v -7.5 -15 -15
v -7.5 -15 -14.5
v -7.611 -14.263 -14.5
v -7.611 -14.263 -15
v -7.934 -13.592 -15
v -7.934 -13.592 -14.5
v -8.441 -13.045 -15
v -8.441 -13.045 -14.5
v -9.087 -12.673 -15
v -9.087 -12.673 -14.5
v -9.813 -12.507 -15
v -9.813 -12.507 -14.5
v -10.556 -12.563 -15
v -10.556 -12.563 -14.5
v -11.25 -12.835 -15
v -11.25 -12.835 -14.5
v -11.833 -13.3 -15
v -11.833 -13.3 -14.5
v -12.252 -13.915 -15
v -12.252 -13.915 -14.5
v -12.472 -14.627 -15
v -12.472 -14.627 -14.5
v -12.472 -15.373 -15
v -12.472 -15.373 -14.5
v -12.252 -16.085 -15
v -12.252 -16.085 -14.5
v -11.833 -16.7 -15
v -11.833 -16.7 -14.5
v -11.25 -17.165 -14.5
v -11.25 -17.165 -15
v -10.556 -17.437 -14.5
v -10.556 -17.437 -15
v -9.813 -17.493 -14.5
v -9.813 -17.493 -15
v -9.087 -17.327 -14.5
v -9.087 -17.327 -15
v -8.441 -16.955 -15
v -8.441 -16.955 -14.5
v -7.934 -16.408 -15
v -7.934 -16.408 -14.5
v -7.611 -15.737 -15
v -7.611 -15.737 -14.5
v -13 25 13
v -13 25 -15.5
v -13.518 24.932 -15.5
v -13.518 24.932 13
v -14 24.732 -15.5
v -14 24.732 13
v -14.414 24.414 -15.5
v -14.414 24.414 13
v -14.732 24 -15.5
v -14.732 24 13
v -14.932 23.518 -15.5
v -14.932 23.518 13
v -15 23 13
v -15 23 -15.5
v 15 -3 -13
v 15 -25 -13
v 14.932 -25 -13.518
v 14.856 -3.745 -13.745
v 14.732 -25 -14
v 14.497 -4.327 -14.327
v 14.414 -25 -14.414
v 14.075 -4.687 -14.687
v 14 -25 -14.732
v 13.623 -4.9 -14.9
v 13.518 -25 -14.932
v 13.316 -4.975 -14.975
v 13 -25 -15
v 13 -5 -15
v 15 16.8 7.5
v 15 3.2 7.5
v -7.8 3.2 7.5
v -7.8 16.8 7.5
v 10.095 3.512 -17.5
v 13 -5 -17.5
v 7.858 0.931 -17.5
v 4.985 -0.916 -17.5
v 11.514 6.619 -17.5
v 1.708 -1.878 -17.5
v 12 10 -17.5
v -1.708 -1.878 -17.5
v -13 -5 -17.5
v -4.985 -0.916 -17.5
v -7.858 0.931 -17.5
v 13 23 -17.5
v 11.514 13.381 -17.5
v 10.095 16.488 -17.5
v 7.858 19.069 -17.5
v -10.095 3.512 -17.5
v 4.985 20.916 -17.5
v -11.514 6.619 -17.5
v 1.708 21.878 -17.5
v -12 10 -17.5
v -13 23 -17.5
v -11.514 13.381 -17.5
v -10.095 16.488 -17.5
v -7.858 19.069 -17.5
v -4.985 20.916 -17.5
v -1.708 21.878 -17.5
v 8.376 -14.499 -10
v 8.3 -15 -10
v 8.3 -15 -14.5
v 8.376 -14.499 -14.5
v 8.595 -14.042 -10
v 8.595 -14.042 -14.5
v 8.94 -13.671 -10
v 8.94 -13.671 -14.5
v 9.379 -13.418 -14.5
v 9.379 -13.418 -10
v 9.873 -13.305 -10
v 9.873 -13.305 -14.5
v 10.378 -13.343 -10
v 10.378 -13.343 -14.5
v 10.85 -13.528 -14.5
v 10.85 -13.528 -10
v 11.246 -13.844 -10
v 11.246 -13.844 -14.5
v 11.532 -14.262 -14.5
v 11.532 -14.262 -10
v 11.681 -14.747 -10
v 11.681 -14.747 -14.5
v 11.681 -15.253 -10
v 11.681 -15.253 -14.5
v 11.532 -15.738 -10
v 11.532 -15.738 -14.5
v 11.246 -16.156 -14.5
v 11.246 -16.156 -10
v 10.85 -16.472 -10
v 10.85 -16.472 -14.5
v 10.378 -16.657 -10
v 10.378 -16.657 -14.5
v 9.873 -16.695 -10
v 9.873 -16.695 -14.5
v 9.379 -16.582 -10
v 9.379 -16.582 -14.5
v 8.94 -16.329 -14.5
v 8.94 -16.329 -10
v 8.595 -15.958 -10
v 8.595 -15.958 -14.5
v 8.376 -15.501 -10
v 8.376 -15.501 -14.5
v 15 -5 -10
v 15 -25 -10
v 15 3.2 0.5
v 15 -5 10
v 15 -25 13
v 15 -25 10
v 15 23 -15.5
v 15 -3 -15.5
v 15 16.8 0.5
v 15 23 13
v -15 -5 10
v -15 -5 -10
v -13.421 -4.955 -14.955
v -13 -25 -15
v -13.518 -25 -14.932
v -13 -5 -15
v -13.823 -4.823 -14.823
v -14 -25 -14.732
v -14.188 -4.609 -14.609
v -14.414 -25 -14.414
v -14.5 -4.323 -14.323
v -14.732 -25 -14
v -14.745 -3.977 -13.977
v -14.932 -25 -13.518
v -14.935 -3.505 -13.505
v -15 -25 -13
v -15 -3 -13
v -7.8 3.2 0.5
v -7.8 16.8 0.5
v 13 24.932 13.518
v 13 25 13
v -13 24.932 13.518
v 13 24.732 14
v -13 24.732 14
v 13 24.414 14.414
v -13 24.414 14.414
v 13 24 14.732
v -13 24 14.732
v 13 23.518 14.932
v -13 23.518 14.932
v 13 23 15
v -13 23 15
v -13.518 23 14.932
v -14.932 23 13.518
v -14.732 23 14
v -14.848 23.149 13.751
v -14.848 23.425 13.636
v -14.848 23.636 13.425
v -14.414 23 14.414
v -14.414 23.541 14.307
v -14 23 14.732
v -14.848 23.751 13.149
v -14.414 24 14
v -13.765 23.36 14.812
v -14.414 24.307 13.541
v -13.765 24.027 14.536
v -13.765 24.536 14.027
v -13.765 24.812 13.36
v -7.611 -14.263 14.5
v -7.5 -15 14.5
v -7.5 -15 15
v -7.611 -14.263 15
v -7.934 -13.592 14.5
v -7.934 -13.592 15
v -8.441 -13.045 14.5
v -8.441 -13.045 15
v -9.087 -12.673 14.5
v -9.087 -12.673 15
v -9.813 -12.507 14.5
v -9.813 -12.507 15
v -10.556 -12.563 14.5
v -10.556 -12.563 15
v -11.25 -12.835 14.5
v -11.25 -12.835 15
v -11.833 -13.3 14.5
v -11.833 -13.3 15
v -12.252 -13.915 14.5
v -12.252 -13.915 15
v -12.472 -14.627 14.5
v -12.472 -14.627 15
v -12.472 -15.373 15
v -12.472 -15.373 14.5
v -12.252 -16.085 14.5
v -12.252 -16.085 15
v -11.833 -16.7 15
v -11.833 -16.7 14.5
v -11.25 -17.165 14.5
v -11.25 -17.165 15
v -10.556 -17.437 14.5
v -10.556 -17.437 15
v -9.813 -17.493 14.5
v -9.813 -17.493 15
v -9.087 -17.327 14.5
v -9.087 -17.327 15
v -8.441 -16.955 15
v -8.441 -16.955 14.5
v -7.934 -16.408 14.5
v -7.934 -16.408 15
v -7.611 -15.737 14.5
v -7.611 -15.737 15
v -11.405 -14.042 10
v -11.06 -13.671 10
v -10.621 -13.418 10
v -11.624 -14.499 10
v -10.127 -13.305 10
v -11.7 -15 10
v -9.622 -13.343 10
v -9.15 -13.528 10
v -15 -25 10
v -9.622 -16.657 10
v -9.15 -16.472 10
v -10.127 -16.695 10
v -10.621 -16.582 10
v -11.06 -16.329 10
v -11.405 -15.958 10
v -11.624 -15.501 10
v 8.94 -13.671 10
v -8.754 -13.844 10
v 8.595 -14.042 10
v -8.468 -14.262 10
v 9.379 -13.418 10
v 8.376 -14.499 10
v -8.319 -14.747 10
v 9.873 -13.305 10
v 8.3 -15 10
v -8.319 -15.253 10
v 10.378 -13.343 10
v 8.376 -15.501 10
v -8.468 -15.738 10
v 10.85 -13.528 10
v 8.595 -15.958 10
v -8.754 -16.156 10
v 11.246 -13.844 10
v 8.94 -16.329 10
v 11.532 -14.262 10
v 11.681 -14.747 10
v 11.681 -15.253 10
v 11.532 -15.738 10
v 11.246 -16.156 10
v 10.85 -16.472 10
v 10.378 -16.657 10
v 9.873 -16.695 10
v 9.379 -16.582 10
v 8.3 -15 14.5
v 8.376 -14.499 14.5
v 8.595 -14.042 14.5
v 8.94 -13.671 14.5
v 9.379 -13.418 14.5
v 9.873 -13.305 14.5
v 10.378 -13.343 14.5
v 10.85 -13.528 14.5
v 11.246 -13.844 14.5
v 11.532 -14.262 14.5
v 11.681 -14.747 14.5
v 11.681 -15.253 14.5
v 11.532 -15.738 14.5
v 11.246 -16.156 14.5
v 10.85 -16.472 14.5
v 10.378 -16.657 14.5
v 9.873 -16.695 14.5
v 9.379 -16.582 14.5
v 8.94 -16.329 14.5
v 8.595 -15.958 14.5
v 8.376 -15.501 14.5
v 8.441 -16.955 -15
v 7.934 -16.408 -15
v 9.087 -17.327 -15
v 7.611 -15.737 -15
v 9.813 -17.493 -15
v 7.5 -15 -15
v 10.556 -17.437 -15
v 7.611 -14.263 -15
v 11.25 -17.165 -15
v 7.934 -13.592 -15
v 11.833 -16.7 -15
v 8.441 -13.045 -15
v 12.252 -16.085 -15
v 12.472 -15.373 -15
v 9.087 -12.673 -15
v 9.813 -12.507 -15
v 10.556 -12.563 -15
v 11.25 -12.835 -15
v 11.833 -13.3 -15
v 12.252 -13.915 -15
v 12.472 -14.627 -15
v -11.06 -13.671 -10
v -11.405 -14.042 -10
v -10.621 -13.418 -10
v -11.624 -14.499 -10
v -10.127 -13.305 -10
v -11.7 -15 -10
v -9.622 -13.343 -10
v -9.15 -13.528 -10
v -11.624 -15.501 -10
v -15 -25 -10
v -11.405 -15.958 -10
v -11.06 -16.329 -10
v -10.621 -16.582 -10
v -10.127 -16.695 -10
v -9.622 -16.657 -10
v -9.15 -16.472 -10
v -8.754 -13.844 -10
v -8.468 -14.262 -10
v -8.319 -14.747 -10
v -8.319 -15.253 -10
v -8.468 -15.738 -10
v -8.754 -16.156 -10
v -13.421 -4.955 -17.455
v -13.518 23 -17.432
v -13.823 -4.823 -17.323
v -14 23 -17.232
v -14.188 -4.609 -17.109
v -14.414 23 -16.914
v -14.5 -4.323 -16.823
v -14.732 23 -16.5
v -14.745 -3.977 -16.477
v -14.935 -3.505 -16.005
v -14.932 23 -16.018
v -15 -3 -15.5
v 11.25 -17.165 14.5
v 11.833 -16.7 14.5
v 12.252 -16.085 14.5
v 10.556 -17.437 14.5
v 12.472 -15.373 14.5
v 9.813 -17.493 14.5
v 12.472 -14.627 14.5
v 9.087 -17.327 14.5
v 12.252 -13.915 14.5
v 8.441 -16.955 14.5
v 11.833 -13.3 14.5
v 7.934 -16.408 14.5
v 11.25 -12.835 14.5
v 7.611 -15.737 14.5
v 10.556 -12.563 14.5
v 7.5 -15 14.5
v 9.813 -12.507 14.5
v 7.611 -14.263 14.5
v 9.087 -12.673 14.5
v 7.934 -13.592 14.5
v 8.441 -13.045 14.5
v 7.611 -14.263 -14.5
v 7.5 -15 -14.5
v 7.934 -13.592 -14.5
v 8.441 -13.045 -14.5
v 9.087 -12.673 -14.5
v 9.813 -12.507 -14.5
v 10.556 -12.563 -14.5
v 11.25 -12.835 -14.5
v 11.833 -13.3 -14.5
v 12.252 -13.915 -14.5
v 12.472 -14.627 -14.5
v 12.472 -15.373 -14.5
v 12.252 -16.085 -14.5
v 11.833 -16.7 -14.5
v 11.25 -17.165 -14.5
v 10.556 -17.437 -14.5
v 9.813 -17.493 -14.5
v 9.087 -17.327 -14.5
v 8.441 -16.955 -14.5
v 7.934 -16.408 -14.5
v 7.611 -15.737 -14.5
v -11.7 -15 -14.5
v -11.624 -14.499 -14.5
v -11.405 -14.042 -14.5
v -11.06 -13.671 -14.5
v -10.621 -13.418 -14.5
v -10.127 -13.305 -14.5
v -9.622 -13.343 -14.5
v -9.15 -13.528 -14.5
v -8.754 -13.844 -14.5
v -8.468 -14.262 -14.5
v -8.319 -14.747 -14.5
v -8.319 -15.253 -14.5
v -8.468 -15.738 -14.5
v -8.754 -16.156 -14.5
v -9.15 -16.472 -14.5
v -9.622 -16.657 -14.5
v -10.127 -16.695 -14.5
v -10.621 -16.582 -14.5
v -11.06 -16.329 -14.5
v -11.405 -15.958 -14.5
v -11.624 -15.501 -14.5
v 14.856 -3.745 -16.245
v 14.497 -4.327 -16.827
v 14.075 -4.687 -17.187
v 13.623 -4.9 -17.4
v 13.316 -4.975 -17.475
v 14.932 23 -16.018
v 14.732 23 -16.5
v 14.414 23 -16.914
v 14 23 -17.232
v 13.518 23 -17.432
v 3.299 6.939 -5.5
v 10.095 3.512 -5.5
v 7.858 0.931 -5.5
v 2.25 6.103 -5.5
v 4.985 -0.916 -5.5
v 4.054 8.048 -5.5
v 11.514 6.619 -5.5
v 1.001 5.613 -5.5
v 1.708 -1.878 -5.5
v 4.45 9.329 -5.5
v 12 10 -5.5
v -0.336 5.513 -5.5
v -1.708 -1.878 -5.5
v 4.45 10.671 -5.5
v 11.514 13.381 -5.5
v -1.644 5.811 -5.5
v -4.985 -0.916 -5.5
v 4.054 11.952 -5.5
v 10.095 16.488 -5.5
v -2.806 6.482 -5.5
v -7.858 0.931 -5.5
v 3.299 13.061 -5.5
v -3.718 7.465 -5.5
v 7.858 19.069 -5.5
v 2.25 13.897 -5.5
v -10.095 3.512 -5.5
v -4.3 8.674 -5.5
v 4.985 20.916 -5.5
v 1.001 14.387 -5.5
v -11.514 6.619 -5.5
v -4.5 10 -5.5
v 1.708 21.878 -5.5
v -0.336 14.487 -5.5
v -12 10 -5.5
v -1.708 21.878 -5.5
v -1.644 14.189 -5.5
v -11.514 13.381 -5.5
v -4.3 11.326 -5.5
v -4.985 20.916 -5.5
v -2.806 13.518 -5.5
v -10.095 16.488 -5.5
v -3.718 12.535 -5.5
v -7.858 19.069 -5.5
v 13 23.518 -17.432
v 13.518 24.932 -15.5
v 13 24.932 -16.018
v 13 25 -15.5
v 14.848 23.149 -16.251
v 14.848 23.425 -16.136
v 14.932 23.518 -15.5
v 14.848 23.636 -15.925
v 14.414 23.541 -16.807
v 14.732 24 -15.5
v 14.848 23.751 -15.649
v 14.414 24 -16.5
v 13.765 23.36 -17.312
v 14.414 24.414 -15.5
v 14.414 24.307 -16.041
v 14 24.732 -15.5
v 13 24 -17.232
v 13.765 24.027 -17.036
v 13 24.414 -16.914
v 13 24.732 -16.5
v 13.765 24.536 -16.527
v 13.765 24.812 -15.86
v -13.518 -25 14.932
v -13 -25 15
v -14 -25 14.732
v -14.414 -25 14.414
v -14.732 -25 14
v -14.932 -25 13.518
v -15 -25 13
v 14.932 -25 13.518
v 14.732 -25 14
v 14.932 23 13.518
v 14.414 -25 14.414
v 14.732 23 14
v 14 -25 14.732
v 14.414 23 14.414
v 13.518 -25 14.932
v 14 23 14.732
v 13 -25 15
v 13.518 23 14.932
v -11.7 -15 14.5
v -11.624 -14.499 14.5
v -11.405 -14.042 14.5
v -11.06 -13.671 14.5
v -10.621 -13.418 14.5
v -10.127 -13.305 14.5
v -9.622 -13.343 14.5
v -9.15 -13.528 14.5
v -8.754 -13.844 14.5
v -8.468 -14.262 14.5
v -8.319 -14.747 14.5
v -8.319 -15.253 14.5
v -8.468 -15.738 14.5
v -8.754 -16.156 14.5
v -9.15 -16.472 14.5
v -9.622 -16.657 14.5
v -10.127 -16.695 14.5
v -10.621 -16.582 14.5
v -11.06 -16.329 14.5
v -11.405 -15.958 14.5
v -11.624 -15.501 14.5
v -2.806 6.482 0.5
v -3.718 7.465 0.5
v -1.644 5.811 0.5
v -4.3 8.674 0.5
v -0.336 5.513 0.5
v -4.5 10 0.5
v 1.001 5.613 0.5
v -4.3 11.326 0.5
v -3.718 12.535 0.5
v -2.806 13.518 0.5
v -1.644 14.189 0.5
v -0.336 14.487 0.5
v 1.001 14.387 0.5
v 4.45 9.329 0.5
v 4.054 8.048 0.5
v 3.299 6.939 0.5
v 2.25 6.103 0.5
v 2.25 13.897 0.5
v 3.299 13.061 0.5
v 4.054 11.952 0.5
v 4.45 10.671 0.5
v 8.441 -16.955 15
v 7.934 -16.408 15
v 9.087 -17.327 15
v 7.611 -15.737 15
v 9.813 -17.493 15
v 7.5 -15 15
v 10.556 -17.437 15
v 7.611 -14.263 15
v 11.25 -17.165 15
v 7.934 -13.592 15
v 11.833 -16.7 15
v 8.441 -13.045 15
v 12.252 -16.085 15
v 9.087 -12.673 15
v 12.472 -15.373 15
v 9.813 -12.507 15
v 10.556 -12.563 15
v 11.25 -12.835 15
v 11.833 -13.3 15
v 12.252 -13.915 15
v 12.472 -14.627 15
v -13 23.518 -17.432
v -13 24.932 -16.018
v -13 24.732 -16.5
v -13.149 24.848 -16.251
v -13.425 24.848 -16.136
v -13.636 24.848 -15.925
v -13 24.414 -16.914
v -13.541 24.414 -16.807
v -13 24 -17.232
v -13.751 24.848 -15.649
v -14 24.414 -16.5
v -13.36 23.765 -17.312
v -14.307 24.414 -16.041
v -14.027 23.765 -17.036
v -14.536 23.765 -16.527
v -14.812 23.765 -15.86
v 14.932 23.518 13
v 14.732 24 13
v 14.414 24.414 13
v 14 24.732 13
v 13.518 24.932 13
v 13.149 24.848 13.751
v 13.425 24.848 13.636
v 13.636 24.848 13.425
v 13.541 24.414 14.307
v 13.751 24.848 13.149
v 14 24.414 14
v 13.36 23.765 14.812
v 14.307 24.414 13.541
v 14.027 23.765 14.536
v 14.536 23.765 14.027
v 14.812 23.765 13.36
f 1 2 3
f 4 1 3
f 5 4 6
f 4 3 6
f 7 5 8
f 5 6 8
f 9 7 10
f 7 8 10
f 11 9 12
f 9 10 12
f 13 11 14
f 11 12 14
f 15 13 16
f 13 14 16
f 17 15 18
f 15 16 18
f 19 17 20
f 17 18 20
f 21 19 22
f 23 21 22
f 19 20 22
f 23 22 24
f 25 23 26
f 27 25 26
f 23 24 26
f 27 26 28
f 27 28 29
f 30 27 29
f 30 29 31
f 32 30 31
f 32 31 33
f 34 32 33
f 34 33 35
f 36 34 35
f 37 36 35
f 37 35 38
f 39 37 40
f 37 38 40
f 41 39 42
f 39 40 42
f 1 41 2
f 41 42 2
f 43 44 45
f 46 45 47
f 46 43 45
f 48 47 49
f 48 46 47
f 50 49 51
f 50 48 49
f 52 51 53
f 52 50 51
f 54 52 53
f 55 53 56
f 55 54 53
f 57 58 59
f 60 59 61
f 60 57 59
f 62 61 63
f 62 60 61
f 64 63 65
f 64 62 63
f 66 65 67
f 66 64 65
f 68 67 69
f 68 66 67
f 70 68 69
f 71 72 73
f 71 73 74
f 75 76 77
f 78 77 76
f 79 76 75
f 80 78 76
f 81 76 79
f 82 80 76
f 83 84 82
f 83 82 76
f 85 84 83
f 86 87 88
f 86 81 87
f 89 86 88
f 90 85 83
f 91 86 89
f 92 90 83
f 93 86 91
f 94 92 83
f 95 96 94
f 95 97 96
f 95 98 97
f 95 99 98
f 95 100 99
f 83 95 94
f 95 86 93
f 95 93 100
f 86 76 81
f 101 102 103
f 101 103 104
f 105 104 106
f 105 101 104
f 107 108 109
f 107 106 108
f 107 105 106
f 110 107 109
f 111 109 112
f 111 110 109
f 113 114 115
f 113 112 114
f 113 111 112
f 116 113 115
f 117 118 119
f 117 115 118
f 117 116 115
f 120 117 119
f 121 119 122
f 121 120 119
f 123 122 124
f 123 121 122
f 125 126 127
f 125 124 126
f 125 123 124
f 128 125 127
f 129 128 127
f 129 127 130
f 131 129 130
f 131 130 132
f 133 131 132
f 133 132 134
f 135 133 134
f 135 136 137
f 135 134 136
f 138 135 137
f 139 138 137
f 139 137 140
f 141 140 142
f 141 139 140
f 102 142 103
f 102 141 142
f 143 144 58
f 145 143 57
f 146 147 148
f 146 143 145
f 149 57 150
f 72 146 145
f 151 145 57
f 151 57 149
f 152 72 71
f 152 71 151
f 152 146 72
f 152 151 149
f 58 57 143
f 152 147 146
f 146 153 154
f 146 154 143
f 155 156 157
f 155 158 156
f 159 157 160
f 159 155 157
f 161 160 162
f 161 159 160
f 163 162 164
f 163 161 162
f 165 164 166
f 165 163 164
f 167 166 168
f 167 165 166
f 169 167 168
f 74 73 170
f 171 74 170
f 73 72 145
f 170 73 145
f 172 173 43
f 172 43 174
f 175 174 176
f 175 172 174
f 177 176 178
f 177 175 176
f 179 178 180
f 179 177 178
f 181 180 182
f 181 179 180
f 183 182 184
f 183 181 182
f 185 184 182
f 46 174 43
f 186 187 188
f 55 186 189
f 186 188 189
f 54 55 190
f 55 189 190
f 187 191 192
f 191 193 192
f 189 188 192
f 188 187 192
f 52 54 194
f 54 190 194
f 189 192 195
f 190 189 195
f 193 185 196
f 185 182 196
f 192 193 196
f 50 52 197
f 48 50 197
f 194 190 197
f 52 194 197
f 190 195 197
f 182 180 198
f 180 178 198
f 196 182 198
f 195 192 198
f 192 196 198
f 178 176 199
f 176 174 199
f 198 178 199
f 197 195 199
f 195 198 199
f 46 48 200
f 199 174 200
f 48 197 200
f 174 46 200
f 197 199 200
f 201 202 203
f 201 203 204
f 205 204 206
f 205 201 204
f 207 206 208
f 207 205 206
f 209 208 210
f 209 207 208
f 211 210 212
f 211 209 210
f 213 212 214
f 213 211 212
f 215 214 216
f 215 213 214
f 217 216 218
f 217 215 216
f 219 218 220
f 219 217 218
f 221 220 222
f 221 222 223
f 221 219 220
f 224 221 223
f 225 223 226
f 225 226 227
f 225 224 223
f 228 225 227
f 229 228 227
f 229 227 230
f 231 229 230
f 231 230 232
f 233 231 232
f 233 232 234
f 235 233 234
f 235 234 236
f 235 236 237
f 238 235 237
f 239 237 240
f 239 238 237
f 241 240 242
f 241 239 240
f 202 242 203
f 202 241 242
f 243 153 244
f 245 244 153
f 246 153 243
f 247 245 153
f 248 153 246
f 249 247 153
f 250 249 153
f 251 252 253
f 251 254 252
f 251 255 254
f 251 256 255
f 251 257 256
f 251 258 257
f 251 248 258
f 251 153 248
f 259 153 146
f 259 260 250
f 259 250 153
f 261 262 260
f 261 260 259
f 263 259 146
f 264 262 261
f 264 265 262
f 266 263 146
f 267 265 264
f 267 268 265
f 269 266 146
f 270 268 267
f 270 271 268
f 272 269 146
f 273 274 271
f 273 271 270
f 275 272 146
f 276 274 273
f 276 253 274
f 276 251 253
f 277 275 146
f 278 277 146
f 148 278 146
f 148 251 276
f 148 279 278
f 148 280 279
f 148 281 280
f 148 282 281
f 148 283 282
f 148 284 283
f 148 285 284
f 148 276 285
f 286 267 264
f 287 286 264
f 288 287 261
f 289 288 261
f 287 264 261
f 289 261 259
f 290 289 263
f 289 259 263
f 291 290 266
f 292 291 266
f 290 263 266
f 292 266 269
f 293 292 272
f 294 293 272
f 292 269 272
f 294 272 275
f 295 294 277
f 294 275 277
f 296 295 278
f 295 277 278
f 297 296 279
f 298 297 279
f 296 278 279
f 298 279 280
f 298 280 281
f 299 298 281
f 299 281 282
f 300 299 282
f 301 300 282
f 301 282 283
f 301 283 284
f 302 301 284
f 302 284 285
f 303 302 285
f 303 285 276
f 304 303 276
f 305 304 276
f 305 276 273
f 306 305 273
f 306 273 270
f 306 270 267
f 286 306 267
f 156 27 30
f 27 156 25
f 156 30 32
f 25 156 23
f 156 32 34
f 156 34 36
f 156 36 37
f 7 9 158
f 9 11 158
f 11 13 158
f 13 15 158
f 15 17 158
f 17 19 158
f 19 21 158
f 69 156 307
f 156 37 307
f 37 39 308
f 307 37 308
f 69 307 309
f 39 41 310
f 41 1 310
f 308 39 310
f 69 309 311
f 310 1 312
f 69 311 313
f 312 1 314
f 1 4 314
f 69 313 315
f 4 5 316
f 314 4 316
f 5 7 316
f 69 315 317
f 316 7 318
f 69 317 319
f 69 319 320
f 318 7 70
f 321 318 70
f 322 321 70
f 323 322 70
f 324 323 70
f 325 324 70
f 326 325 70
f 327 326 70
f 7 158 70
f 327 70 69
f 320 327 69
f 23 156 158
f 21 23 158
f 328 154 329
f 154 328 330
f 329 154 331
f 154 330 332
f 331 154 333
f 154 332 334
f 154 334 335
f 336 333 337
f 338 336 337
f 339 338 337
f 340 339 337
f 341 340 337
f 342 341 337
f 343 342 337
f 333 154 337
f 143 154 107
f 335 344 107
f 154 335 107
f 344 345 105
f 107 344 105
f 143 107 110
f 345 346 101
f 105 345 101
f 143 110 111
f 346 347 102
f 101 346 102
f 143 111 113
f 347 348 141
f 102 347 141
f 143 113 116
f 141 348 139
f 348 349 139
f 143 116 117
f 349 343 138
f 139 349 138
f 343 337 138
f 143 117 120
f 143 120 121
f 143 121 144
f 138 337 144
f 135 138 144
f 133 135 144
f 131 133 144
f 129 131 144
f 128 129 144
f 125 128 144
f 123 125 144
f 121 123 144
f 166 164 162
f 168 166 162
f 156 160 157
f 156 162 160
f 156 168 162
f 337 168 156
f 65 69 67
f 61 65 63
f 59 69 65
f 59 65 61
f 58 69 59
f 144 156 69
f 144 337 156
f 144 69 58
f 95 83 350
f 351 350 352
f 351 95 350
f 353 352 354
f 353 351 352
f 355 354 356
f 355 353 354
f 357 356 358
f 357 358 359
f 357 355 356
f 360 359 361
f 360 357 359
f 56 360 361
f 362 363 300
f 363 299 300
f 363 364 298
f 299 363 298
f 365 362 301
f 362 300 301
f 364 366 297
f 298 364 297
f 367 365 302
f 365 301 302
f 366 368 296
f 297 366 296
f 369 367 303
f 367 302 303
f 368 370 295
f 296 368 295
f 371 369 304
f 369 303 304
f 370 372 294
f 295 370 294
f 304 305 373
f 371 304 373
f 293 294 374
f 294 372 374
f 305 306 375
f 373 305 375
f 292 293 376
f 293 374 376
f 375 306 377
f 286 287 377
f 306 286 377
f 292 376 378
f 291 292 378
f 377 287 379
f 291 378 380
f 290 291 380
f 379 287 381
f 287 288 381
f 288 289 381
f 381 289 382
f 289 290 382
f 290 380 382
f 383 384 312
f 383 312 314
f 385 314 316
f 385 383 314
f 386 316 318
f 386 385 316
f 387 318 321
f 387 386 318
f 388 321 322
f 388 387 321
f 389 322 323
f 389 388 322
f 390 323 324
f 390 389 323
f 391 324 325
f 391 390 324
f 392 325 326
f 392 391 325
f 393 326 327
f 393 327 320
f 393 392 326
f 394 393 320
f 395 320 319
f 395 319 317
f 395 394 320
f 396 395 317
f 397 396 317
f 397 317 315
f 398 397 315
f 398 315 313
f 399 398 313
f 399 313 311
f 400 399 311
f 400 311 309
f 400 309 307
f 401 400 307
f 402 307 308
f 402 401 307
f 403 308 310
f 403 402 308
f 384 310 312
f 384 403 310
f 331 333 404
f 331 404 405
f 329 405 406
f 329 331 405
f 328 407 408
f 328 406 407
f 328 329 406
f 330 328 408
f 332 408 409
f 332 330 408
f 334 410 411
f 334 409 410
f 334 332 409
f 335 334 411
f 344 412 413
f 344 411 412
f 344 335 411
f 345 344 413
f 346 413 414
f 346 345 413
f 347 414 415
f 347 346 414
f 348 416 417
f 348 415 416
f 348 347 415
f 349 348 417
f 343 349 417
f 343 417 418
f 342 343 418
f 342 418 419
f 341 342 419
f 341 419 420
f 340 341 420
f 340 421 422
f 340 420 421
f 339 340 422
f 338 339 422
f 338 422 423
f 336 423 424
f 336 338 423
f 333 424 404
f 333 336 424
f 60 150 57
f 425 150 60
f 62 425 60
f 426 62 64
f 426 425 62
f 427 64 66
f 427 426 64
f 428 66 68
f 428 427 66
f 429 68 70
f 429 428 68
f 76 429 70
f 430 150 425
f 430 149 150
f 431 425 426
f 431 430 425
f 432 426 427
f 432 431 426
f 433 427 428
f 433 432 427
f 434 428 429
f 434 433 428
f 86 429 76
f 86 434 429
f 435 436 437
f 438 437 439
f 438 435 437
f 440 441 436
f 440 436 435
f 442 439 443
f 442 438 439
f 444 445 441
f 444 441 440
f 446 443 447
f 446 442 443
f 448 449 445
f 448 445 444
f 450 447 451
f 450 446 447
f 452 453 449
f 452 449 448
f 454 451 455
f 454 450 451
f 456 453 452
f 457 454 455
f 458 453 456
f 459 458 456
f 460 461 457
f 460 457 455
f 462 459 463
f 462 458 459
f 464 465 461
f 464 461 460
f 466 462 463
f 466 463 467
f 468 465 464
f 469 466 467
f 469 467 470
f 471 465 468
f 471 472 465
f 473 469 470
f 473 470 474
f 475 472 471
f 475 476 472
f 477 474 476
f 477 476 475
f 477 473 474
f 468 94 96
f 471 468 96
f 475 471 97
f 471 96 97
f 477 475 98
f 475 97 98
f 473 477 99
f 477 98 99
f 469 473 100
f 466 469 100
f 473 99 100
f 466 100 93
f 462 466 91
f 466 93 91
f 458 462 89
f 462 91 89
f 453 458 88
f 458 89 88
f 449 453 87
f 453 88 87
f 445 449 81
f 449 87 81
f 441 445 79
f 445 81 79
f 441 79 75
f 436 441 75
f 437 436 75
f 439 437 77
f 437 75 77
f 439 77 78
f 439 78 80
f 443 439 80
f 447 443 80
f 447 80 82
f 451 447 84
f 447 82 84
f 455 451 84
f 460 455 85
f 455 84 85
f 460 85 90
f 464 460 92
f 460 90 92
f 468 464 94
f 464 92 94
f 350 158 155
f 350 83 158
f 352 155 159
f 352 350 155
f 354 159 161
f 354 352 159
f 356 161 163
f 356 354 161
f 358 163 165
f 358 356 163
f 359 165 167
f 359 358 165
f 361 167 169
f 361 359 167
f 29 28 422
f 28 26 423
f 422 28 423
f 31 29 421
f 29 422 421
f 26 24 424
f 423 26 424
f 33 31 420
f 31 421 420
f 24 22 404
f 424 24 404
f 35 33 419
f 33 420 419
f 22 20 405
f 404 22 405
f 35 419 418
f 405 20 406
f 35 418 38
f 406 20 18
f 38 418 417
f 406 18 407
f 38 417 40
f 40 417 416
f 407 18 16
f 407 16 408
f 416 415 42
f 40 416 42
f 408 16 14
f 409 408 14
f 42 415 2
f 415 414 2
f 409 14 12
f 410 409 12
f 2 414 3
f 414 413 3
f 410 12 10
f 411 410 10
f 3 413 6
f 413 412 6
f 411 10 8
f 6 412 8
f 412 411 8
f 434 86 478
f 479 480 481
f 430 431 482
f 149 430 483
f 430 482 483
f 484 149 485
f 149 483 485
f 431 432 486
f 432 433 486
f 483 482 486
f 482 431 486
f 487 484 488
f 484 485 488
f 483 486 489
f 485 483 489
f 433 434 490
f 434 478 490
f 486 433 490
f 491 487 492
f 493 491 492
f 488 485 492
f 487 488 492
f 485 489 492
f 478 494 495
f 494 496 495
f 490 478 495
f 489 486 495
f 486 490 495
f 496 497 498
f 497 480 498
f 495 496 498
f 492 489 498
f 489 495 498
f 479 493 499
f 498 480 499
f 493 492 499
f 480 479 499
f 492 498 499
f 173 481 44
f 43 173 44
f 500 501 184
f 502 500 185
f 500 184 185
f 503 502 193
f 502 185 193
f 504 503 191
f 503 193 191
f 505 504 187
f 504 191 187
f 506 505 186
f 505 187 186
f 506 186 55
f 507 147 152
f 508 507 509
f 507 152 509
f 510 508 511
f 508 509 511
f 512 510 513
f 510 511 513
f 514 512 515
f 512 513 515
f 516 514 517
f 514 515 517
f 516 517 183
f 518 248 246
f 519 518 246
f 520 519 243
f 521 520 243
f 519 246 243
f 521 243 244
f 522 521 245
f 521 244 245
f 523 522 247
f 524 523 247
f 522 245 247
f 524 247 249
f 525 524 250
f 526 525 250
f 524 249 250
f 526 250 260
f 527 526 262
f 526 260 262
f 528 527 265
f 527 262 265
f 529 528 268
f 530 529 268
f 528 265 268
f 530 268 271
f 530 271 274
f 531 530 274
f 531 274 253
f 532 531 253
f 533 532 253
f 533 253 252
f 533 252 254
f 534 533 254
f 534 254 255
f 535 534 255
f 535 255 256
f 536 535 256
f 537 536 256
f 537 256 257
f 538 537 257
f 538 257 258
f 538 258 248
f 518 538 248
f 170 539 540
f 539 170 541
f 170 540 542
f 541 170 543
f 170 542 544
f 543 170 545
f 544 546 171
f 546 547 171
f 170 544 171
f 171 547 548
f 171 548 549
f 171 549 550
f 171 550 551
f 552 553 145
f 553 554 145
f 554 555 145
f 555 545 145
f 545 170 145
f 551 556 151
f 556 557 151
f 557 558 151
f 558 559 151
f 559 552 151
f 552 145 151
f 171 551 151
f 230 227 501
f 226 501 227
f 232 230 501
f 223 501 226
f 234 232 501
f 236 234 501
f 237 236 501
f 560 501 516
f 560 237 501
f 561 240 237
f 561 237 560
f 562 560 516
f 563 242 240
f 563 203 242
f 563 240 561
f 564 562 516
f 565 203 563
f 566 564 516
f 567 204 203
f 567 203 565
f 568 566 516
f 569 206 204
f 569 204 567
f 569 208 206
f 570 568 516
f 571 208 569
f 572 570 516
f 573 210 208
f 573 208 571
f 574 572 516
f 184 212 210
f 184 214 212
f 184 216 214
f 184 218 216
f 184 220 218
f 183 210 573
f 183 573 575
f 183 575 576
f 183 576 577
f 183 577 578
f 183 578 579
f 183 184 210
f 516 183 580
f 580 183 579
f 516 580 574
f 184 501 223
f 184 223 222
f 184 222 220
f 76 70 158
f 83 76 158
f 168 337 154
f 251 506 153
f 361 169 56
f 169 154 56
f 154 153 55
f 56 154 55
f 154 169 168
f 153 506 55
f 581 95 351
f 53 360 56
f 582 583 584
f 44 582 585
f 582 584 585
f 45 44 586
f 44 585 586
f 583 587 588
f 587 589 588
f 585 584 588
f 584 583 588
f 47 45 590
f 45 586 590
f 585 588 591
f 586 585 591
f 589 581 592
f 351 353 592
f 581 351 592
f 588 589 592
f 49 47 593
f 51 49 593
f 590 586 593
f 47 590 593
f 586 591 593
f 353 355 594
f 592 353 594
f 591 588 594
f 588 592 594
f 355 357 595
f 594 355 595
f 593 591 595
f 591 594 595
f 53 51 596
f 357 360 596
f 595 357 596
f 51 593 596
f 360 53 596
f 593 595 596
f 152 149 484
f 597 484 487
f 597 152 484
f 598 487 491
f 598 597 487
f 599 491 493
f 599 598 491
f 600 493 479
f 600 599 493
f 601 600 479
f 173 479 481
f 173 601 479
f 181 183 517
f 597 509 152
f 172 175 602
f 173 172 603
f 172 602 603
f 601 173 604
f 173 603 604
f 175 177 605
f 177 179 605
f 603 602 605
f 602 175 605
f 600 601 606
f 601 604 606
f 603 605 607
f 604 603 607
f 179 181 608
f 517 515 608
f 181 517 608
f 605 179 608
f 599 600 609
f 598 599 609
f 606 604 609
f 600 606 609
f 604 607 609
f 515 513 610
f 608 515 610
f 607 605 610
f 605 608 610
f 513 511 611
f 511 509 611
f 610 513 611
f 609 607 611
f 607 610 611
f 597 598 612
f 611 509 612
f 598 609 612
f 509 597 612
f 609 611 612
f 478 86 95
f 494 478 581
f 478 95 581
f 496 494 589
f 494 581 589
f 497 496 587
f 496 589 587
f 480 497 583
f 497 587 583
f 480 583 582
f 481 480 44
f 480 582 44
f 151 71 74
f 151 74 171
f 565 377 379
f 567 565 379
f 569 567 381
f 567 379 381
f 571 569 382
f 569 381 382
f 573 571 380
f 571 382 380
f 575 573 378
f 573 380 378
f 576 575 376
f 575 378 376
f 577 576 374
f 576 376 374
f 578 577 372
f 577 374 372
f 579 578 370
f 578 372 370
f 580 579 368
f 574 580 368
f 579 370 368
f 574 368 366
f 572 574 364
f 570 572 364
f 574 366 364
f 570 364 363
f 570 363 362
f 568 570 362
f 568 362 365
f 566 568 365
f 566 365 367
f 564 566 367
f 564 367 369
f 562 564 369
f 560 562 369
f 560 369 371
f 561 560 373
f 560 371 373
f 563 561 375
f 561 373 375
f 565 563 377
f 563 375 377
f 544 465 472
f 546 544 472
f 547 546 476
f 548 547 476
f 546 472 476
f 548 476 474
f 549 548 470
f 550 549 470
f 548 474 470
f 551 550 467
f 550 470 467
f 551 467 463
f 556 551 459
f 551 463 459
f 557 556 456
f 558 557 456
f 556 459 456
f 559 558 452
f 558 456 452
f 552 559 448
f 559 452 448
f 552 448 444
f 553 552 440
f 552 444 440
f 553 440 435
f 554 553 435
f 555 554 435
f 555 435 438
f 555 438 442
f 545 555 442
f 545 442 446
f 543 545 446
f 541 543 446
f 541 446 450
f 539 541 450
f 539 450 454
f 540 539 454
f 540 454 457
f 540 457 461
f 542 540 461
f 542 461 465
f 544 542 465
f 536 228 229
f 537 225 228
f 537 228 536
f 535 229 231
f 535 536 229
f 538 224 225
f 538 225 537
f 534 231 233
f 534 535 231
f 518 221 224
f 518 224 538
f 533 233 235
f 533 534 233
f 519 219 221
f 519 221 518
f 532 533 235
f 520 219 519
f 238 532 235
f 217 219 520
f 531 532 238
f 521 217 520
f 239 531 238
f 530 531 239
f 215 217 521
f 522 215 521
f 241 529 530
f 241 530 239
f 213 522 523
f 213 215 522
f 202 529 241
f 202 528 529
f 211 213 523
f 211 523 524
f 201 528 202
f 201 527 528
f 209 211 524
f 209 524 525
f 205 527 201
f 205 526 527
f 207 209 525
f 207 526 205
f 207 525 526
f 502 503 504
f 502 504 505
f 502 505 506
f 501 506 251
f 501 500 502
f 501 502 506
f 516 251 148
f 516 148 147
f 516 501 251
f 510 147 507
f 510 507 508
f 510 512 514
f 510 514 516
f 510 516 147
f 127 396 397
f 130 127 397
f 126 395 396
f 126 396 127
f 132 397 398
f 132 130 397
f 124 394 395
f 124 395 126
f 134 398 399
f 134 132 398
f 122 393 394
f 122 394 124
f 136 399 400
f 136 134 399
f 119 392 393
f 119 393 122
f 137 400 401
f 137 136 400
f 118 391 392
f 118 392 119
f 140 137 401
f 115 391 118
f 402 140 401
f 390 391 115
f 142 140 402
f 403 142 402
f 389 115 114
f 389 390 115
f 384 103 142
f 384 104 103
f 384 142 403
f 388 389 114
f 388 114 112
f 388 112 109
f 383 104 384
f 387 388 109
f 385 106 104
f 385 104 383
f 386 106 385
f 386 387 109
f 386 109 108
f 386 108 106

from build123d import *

# Parameters (mm, degrees)
SKETCH1_W               = 30
SKETCH1_H               = 50
BOSS_EXTRUDE1_DEPTH     = 15
SKETCH6_W               = 30
SKETCH6_H               = 30
BOSS_EXTRUDE2_DEPTH     = 2.5
SKETCH2_W               = 30
SKETCH2_H               = 20
CUT_EXTRUDE1_DEPTH      = 20
SKETCH3_R               = 1.7
CUT_EXTRUDE2_DEPTH      = 28.5
CUT_EXTRUDE2_DEPTH_BACK = 6
SKETCH5_W               = 7
SKETCH5_H               = 13.6
CUT_EXTRUDE5_DEPTH      = 22.8
CUT_EXTRUDE8_START      = -4.5
SKETCH3_4_R             = 2.5
CUT_EXTRUDE8_DEPTH      = 0.5
MIRROR4_START           = -4.5
MIRROR4_COPY_1_SKETCH_R = 2.5
MIRROR4_COPY_1_DEPTH    = 0.5
FILLET1_R               = 2
SKETCH7_R               = 4.5
SKETCH7_R_2             = 12
CUT_EXTRUDE9_DEPTH      = 12
CUT_EXTRUDE10_REACH     = 34.5
SKETCH7_4_R             = 4.5


with BuildPart() as part:
    # Sketch1 → Boss-Extrude1 (new body, symmetric)
    with BuildSketch(Plane.XY):
        Rectangle(SKETCH1_W, SKETCH1_H)
    extrude(amount=BOSS_EXTRUDE1_DEPTH, both=True)

    # Sketch6 → Boss-Extrude2 (add)
    with BuildSketch(Plane(origin=(0, 0, -15), x_dir=(-1, 0, 0), z_dir=(0, 0, -1))):
        with Locations((0, 10)):
            Rectangle(SKETCH6_W, SKETCH6_H)
    extrude(amount=BOSS_EXTRUDE2_DEPTH)

    # Sketch2 → Cut-Extrude1 (cut)
    with BuildSketch(Plane.XZ.offset(25)):
        Rectangle(SKETCH2_W, SKETCH2_H)
    extrude(amount=-CUT_EXTRUDE1_DEPTH, mode=Mode.SUBTRACT)

    # Sketch3 → Cut-Extrude2 (cut, two sides)
    with BuildSketch(Plane(origin=(0, 0, 10), x_dir=(-1, 0, 0), z_dir=(0, 0, -1))) as cut_extrude2_sk:
        with Locations((-10, -15)):
            Circle(SKETCH3_R)
        with Locations((10, -15)):
            Circle(SKETCH3_R)
    extrude(amount=CUT_EXTRUDE2_DEPTH, mode=Mode.SUBTRACT)
    extrude(cut_extrude2_sk.sketch, amount=-CUT_EXTRUDE2_DEPTH_BACK, mode=Mode.SUBTRACT)

    # Sketch5 → Cut-Extrude5 (cut)
    with BuildSketch(Plane(origin=(15, 0, 0), x_dir=(0, 0, -1), z_dir=(1, 0, 0))):
        with Locations((-4, 10)):
            Rectangle(SKETCH5_W, SKETCH5_H)
    extrude(amount=-CUT_EXTRUDE5_DEPTH, mode=Mode.SUBTRACT)

    # Sketch3<4> → Cut-Extrude8 (cut)
    with BuildSketch(Plane(origin=(0, 0, 10), x_dir=(-1, 0, 0), z_dir=(0, 0, -1)).offset(CUT_EXTRUDE8_START)):
        with Locations((-10, -15)):
            Circle(SKETCH3_4_R)
    cut_extrude8 = extrude(amount=-CUT_EXTRUDE8_DEPTH, mode=Mode.SUBTRACT)

    # Mirror3: Cut-Extrude8 across plane
    add(cut_extrude8.mirror(Plane(origin=(0, 0, 0), x_dir=(0, 0, 1), z_dir=(1, 0, 0))), mode=Mode.SUBTRACT)

    # Mirror4: Cut-Extrude8 across plane
    add(cut_extrude8.mirror(Plane.XY), mode=Mode.SUBTRACT)

    # Mirror4 copy 1 sketch → Mirror4 copy 1 (cut)
    with BuildSketch(Plane.XY.offset(-10).offset(MIRROR4_START)):
        with Locations((-10, -15)):
            Circle(MIRROR4_COPY_1_SKETCH_R)
    extrude(amount=-MIRROR4_COPY_1_DEPTH, mode=Mode.SUBTRACT)

    # Fillet1
    fillet1_edges = [part.edges().sort_by_distance(p)[0] for p in [
        (15, 0, 15),
        (0, 25, 15),
        (-15, -15, -15),
        (-15, -5, -16.25),
        (15, -5, -16.25),
        (-15, 10, -17.5),
        (0, 25, -17.5),
        (15, 10, -17.5),
        (-15, 0, 15),
        (15, -15, -15),
        (-15, 25, -1.25),
        (15, 25, -1.25),
    ]]
    fillet(fillet1_edges, radius=FILLET1_R)

    # Sketch7 → Cut-Extrude9 (cut)
    with BuildSketch(Plane(origin=(0, 0, -17.5), x_dir=(-1, 0, 0), z_dir=(0, 0, -1))):
        with Locations((0, 10)):
            Circle(SKETCH7_R)
        with Locations((0, 10)):
            Circle(SKETCH7_R_2)
        with Locations((0, 10)):
            Circle(SKETCH7_R, mode=Mode.SUBTRACT)
    extrude(amount=-CUT_EXTRUDE9_DEPTH, mode=Mode.SUBTRACT)

    # Sketch7<4> → Cut-Extrude10 (cut, up to next)
    with BuildSketch(Plane(origin=(0, 0, -17.5), x_dir=(-1, 0, 0), z_dir=(0, 0, -1)), mode=Mode.PRIVATE) as cut_extrude10_sk1:
        with Locations((0, 10)):
            Circle(SKETCH7_4_R)
    cut_extrude10_tool1 = extrude(cut_extrude10_sk1.sketch, amount=-CUT_EXTRUDE10_REACH, mode=Mode.PRIVATE) & part.part
    add(cut_extrude10_tool1.solids().sort_by_distance((0, 10, -17.5))[0], mode=Mode.SUBTRACT)


solid = part.part
